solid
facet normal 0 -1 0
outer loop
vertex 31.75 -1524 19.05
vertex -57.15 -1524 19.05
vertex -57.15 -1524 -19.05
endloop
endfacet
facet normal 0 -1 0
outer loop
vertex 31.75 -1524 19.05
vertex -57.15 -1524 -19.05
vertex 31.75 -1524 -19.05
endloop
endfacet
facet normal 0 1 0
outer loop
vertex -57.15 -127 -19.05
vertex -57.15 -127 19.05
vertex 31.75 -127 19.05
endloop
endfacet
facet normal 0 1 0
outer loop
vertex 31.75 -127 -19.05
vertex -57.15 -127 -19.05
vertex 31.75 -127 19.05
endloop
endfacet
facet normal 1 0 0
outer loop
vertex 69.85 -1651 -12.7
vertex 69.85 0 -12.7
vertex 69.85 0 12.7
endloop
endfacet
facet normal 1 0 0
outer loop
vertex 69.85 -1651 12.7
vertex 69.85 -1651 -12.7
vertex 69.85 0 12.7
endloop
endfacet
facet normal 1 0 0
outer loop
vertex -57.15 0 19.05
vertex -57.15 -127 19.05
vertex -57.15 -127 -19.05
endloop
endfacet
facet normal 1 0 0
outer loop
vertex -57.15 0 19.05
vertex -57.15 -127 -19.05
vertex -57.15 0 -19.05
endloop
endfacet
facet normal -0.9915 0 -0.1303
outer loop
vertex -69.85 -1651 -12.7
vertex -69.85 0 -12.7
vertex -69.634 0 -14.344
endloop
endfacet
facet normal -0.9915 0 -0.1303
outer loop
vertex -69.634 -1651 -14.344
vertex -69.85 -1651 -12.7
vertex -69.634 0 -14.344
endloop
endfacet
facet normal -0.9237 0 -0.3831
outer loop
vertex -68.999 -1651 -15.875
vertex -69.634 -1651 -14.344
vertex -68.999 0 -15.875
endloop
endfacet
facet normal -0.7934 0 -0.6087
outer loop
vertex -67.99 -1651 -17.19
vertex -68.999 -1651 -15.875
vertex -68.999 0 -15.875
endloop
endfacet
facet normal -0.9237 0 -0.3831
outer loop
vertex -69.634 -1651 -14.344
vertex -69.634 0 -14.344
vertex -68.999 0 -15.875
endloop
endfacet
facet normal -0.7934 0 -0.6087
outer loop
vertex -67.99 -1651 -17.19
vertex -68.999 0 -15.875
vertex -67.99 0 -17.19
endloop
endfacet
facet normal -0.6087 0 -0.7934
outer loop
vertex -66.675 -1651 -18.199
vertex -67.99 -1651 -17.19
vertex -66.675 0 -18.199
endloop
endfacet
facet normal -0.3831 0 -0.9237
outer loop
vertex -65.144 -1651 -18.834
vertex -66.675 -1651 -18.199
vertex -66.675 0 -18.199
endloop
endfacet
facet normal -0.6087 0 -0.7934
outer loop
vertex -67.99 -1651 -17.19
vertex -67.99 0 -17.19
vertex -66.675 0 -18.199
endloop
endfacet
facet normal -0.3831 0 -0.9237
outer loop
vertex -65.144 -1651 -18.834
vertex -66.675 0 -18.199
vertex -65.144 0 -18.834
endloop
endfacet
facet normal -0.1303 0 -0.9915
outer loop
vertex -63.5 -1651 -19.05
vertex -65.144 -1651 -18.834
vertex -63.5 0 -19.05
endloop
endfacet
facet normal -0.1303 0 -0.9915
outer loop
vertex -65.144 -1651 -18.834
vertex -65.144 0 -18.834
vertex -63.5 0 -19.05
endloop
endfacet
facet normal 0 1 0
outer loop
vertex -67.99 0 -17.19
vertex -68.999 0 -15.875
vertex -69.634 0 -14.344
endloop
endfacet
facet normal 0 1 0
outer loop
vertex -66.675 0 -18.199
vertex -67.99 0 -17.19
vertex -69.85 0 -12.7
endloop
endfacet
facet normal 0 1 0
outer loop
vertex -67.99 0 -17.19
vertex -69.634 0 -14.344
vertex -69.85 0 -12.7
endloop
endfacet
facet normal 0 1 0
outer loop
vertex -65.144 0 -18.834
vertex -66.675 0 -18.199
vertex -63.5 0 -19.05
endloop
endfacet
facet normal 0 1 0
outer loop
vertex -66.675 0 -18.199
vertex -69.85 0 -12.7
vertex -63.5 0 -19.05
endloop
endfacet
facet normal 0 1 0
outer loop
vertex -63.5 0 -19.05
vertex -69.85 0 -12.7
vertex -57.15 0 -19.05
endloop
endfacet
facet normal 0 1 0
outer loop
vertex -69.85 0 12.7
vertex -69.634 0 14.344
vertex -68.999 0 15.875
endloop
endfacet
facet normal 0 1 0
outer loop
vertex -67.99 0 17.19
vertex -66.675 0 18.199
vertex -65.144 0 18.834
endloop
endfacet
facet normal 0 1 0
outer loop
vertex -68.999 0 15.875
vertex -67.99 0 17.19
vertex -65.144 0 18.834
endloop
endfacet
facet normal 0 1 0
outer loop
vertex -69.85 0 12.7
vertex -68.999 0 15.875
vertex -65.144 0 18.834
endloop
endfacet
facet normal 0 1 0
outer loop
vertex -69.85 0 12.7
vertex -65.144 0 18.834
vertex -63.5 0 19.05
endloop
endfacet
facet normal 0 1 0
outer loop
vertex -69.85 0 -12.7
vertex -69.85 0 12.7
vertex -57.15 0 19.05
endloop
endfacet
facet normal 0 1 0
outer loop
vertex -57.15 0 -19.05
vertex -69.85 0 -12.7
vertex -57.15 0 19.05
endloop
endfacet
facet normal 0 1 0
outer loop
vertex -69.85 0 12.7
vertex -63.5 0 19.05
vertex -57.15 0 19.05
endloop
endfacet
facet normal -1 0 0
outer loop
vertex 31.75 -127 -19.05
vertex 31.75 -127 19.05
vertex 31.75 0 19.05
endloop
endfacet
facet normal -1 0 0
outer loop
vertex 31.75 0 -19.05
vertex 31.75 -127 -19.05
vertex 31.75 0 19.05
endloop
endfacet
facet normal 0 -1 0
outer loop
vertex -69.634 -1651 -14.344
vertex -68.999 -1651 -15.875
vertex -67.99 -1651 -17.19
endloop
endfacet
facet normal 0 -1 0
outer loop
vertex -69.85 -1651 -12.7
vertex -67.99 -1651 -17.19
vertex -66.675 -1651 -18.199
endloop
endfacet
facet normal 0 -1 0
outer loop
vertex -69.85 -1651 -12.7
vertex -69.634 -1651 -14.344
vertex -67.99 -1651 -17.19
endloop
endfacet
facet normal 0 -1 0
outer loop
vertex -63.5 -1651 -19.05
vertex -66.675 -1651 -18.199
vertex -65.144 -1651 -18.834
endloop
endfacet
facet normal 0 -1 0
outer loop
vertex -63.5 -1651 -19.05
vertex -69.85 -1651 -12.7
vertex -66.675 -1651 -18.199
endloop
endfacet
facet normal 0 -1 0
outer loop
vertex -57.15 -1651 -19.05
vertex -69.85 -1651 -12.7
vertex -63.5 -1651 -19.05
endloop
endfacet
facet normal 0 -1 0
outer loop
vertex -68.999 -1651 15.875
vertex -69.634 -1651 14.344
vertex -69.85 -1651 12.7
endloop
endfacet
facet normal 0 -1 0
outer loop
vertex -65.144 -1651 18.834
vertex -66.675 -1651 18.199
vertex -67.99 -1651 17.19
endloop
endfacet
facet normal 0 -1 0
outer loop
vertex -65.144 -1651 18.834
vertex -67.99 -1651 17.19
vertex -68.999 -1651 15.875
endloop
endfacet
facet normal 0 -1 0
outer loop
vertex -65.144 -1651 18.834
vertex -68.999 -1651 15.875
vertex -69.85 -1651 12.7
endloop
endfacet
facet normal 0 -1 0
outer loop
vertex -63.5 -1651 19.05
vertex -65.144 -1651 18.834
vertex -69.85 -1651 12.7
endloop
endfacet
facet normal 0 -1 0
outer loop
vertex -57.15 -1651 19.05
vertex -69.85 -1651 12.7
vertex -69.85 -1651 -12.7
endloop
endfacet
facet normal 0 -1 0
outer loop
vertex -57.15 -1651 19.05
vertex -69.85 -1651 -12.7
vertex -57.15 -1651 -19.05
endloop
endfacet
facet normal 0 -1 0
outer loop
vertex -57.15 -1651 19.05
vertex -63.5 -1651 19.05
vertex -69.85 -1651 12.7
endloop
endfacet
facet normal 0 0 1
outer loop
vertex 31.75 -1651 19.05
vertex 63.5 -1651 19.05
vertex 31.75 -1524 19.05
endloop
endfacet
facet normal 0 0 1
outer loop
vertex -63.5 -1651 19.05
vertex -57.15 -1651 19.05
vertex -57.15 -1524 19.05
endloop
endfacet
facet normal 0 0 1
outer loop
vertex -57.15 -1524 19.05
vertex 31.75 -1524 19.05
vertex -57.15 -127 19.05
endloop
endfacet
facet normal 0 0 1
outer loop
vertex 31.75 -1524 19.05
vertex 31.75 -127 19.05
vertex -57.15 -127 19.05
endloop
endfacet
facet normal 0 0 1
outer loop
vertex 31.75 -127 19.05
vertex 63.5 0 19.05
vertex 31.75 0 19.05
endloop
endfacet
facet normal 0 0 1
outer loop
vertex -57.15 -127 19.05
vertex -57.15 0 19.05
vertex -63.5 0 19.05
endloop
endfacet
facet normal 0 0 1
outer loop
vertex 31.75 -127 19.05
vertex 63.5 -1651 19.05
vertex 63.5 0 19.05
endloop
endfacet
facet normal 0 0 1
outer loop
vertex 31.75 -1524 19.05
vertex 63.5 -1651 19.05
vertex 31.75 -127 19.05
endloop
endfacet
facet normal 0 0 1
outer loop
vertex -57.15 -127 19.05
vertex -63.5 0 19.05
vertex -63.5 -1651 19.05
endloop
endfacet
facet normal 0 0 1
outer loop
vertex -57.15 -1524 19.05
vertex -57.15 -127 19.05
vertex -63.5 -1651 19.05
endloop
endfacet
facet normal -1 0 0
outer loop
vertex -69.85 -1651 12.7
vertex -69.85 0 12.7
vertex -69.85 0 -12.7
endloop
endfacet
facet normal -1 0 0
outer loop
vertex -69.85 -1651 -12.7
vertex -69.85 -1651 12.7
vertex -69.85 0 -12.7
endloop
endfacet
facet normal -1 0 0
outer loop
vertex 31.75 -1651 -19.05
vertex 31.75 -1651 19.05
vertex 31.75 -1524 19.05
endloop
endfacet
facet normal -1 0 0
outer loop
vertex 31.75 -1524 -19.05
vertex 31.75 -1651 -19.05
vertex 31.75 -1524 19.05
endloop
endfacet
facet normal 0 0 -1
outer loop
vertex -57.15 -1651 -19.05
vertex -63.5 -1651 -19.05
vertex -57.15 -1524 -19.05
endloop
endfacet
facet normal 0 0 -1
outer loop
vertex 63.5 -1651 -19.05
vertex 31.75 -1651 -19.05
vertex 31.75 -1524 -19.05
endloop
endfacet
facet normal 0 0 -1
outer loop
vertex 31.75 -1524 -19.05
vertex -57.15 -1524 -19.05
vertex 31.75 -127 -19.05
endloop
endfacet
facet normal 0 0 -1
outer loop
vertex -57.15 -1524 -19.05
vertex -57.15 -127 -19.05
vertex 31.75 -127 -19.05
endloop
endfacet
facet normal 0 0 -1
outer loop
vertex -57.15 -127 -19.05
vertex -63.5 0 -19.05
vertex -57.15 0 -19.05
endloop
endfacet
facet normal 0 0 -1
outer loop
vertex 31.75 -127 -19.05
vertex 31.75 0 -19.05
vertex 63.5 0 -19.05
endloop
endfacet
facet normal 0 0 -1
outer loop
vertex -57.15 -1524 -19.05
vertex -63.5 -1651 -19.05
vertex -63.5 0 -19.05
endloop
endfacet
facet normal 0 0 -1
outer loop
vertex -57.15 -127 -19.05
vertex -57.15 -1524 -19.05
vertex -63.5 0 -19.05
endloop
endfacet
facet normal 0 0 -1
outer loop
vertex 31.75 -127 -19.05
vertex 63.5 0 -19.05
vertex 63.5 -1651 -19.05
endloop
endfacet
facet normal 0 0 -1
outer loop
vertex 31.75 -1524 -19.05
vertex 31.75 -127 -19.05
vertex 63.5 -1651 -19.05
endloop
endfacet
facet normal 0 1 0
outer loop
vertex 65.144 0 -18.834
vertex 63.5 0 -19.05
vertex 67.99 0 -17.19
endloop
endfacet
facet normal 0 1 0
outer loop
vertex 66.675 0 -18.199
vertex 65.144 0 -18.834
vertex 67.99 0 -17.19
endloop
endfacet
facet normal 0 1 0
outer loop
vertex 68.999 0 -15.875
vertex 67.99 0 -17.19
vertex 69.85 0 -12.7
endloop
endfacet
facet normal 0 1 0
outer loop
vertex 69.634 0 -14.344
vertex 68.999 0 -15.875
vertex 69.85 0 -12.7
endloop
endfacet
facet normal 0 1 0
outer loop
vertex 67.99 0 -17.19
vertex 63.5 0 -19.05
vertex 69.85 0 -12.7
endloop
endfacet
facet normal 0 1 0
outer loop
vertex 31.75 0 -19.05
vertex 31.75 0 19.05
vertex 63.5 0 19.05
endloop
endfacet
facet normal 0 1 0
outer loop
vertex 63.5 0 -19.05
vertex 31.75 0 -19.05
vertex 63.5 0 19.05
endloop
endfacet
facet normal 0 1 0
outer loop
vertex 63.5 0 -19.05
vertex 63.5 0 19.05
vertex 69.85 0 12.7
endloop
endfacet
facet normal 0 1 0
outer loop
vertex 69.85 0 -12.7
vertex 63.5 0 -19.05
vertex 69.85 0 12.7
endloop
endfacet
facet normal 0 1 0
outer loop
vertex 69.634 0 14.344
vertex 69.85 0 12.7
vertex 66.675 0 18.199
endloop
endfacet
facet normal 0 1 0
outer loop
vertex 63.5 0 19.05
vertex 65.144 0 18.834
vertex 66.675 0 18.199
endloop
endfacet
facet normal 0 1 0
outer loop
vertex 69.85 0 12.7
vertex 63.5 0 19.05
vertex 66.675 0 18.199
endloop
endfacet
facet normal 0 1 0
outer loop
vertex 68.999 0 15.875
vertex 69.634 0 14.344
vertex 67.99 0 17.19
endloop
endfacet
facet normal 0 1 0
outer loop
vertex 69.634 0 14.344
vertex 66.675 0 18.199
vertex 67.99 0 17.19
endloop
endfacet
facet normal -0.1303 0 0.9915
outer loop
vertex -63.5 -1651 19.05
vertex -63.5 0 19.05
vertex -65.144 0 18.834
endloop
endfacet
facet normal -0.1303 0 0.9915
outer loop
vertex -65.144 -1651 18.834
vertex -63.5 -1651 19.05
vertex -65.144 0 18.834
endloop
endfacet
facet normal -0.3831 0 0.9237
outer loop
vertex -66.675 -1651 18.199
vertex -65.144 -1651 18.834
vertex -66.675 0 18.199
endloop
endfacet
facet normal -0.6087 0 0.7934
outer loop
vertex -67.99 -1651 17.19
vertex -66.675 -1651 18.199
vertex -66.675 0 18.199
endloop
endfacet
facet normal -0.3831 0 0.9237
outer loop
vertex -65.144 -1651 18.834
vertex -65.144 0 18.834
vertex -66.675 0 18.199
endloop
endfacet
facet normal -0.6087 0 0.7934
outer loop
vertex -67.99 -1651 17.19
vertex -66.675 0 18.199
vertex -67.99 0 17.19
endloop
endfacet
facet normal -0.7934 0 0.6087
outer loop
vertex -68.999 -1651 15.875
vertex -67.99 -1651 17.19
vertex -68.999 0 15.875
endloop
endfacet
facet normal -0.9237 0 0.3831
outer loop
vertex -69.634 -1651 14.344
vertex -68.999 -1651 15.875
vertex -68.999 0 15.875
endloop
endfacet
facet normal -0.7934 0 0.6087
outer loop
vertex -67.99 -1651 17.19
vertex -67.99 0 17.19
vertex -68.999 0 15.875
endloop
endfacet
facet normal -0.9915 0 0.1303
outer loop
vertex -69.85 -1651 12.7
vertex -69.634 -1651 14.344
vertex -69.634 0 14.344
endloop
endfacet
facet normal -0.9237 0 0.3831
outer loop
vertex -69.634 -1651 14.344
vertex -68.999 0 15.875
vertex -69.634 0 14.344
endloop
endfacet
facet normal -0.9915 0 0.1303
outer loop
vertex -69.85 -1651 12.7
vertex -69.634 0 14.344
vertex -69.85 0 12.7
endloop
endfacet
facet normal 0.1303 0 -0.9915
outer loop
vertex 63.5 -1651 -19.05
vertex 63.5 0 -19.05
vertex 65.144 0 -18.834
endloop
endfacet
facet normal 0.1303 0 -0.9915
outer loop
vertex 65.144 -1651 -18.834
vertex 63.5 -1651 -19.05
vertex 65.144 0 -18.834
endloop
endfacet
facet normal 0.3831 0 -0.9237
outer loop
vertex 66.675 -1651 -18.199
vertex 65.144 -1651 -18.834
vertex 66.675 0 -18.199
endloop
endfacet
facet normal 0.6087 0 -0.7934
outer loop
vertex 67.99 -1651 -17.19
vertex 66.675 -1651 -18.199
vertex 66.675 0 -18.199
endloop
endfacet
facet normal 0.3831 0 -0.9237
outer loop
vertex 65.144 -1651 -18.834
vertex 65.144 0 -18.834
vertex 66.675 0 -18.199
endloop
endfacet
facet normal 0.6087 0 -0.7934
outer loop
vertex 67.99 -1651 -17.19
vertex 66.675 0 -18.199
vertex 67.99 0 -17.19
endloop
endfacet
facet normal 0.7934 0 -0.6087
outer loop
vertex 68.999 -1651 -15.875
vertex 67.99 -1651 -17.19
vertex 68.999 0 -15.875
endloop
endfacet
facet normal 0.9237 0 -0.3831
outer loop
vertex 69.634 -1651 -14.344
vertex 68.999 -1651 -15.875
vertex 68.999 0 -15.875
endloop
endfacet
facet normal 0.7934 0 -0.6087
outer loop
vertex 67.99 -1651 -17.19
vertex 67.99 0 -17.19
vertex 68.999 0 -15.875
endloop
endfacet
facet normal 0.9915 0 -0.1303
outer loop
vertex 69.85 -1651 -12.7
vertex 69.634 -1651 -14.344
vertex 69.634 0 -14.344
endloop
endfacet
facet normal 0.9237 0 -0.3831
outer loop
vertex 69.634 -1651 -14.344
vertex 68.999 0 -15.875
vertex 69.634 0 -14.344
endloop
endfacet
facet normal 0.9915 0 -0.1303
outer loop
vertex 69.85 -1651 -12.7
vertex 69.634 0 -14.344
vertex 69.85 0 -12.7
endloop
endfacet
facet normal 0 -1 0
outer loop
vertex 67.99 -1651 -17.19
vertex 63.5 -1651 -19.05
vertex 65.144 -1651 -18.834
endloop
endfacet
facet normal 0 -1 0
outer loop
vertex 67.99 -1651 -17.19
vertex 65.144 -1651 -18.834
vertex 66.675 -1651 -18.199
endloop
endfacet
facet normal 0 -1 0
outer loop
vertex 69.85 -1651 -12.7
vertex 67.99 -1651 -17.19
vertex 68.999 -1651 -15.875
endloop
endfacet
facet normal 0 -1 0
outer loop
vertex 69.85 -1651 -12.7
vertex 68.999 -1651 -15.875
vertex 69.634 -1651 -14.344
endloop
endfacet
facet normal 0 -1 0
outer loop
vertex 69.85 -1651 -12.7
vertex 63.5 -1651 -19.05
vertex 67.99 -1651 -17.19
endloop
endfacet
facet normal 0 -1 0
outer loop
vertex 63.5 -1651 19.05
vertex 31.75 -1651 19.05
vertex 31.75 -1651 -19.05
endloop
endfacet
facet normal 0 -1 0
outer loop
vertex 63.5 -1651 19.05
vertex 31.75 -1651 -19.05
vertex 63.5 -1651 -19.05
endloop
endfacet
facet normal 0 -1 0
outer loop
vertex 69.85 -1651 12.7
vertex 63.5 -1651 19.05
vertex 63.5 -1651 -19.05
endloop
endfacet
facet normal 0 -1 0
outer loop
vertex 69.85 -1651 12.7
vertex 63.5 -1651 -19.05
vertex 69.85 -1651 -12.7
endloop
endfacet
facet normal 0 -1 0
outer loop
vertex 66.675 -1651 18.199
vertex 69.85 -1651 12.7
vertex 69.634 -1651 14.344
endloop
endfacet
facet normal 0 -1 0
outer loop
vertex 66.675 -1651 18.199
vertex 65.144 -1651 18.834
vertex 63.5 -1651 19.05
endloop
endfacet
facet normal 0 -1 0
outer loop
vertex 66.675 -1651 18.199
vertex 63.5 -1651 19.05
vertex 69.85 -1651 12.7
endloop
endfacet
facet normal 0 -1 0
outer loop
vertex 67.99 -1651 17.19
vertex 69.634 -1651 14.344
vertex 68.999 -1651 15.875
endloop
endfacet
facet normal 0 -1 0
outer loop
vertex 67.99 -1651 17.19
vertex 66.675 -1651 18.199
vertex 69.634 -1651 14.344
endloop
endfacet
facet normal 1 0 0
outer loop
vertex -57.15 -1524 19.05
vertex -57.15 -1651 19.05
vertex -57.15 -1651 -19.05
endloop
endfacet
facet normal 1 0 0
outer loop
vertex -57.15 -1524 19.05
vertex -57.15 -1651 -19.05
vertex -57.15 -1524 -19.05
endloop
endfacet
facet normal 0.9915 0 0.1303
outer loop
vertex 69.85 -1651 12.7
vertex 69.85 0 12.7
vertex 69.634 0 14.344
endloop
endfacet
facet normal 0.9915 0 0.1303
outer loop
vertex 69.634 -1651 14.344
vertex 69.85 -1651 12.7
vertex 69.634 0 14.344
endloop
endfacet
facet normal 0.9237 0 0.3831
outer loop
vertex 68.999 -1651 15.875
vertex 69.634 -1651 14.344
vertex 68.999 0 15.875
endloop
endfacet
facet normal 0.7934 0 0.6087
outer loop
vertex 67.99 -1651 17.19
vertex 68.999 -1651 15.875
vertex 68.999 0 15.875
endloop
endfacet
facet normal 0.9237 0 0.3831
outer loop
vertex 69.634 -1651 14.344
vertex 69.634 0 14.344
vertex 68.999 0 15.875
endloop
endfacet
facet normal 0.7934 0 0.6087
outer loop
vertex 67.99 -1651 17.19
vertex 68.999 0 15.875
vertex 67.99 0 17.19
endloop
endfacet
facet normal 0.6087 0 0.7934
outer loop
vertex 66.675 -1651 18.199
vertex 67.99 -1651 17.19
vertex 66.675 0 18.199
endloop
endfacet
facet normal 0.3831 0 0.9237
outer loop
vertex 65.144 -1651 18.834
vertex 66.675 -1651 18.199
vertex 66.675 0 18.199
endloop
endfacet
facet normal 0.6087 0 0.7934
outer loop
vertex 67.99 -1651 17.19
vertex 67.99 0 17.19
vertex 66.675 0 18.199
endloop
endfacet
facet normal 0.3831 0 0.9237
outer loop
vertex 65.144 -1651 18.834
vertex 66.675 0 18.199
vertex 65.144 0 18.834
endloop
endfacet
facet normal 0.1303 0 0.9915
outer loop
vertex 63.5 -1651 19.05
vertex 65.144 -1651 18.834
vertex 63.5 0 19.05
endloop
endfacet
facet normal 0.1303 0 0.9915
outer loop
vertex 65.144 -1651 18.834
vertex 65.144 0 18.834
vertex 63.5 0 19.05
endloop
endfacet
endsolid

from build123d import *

# Parameters (mm, degrees)
F1_DEPTH = 1651
F2_W     = 88.9
F2_H     = 127
F3_DEPTH = 38.101
F4_W     = 88.9
F4_H     = 127
F5_DEPTH = 38.101


with BuildPart() as f1:
    # F0 (on Front) → F1 (new body)
    with BuildSketch(Plane.XZ):
        with BuildLine():
            ThreePointArc((-69.85, -12.7), (-67.990128, -17.190128), (-63.5, -19.05))
            Line((-63.5, -19.05), (63.5, -19.05))
            ThreePointArc((63.5, -19.05), (67.990128, -17.190128), (69.85, -12.7))
            Line((69.85, -12.7), (69.85, 12.7))
            ThreePointArc((69.85, 12.7), (67.990128, 17.190128), (63.5, 19.05))
            Line((63.5, 19.05), (-63.5, 19.05))
            ThreePointArc((-63.5, 19.05), (-67.990128, 17.190128), (-69.85, 12.7))
            Line((-69.85, 12.7), (-69.85, -12.7))
        make_face()
    extrude(amount=F1_DEPTH)

    # F2 (on face) → F3 (cut, through all)
    with BuildSketch(Plane.XY.offset(19.05)):
        with Locations((-12.7, -63.5)):
            Rectangle(F2_W, F2_H)
    extrude(amount=-F3_DEPTH, mode=Mode.SUBTRACT)

    # F4 (on face) → F5 (cut, through all)
    with BuildSketch(Plane.XY.offset(19.05)):
        with Locations((-12.7, -1587.5)):
            Rectangle(F4_W, F4_H)
    extrude(amount=-F5_DEPTH, mode=Mode.SUBTRACT)


solid = f1.part
